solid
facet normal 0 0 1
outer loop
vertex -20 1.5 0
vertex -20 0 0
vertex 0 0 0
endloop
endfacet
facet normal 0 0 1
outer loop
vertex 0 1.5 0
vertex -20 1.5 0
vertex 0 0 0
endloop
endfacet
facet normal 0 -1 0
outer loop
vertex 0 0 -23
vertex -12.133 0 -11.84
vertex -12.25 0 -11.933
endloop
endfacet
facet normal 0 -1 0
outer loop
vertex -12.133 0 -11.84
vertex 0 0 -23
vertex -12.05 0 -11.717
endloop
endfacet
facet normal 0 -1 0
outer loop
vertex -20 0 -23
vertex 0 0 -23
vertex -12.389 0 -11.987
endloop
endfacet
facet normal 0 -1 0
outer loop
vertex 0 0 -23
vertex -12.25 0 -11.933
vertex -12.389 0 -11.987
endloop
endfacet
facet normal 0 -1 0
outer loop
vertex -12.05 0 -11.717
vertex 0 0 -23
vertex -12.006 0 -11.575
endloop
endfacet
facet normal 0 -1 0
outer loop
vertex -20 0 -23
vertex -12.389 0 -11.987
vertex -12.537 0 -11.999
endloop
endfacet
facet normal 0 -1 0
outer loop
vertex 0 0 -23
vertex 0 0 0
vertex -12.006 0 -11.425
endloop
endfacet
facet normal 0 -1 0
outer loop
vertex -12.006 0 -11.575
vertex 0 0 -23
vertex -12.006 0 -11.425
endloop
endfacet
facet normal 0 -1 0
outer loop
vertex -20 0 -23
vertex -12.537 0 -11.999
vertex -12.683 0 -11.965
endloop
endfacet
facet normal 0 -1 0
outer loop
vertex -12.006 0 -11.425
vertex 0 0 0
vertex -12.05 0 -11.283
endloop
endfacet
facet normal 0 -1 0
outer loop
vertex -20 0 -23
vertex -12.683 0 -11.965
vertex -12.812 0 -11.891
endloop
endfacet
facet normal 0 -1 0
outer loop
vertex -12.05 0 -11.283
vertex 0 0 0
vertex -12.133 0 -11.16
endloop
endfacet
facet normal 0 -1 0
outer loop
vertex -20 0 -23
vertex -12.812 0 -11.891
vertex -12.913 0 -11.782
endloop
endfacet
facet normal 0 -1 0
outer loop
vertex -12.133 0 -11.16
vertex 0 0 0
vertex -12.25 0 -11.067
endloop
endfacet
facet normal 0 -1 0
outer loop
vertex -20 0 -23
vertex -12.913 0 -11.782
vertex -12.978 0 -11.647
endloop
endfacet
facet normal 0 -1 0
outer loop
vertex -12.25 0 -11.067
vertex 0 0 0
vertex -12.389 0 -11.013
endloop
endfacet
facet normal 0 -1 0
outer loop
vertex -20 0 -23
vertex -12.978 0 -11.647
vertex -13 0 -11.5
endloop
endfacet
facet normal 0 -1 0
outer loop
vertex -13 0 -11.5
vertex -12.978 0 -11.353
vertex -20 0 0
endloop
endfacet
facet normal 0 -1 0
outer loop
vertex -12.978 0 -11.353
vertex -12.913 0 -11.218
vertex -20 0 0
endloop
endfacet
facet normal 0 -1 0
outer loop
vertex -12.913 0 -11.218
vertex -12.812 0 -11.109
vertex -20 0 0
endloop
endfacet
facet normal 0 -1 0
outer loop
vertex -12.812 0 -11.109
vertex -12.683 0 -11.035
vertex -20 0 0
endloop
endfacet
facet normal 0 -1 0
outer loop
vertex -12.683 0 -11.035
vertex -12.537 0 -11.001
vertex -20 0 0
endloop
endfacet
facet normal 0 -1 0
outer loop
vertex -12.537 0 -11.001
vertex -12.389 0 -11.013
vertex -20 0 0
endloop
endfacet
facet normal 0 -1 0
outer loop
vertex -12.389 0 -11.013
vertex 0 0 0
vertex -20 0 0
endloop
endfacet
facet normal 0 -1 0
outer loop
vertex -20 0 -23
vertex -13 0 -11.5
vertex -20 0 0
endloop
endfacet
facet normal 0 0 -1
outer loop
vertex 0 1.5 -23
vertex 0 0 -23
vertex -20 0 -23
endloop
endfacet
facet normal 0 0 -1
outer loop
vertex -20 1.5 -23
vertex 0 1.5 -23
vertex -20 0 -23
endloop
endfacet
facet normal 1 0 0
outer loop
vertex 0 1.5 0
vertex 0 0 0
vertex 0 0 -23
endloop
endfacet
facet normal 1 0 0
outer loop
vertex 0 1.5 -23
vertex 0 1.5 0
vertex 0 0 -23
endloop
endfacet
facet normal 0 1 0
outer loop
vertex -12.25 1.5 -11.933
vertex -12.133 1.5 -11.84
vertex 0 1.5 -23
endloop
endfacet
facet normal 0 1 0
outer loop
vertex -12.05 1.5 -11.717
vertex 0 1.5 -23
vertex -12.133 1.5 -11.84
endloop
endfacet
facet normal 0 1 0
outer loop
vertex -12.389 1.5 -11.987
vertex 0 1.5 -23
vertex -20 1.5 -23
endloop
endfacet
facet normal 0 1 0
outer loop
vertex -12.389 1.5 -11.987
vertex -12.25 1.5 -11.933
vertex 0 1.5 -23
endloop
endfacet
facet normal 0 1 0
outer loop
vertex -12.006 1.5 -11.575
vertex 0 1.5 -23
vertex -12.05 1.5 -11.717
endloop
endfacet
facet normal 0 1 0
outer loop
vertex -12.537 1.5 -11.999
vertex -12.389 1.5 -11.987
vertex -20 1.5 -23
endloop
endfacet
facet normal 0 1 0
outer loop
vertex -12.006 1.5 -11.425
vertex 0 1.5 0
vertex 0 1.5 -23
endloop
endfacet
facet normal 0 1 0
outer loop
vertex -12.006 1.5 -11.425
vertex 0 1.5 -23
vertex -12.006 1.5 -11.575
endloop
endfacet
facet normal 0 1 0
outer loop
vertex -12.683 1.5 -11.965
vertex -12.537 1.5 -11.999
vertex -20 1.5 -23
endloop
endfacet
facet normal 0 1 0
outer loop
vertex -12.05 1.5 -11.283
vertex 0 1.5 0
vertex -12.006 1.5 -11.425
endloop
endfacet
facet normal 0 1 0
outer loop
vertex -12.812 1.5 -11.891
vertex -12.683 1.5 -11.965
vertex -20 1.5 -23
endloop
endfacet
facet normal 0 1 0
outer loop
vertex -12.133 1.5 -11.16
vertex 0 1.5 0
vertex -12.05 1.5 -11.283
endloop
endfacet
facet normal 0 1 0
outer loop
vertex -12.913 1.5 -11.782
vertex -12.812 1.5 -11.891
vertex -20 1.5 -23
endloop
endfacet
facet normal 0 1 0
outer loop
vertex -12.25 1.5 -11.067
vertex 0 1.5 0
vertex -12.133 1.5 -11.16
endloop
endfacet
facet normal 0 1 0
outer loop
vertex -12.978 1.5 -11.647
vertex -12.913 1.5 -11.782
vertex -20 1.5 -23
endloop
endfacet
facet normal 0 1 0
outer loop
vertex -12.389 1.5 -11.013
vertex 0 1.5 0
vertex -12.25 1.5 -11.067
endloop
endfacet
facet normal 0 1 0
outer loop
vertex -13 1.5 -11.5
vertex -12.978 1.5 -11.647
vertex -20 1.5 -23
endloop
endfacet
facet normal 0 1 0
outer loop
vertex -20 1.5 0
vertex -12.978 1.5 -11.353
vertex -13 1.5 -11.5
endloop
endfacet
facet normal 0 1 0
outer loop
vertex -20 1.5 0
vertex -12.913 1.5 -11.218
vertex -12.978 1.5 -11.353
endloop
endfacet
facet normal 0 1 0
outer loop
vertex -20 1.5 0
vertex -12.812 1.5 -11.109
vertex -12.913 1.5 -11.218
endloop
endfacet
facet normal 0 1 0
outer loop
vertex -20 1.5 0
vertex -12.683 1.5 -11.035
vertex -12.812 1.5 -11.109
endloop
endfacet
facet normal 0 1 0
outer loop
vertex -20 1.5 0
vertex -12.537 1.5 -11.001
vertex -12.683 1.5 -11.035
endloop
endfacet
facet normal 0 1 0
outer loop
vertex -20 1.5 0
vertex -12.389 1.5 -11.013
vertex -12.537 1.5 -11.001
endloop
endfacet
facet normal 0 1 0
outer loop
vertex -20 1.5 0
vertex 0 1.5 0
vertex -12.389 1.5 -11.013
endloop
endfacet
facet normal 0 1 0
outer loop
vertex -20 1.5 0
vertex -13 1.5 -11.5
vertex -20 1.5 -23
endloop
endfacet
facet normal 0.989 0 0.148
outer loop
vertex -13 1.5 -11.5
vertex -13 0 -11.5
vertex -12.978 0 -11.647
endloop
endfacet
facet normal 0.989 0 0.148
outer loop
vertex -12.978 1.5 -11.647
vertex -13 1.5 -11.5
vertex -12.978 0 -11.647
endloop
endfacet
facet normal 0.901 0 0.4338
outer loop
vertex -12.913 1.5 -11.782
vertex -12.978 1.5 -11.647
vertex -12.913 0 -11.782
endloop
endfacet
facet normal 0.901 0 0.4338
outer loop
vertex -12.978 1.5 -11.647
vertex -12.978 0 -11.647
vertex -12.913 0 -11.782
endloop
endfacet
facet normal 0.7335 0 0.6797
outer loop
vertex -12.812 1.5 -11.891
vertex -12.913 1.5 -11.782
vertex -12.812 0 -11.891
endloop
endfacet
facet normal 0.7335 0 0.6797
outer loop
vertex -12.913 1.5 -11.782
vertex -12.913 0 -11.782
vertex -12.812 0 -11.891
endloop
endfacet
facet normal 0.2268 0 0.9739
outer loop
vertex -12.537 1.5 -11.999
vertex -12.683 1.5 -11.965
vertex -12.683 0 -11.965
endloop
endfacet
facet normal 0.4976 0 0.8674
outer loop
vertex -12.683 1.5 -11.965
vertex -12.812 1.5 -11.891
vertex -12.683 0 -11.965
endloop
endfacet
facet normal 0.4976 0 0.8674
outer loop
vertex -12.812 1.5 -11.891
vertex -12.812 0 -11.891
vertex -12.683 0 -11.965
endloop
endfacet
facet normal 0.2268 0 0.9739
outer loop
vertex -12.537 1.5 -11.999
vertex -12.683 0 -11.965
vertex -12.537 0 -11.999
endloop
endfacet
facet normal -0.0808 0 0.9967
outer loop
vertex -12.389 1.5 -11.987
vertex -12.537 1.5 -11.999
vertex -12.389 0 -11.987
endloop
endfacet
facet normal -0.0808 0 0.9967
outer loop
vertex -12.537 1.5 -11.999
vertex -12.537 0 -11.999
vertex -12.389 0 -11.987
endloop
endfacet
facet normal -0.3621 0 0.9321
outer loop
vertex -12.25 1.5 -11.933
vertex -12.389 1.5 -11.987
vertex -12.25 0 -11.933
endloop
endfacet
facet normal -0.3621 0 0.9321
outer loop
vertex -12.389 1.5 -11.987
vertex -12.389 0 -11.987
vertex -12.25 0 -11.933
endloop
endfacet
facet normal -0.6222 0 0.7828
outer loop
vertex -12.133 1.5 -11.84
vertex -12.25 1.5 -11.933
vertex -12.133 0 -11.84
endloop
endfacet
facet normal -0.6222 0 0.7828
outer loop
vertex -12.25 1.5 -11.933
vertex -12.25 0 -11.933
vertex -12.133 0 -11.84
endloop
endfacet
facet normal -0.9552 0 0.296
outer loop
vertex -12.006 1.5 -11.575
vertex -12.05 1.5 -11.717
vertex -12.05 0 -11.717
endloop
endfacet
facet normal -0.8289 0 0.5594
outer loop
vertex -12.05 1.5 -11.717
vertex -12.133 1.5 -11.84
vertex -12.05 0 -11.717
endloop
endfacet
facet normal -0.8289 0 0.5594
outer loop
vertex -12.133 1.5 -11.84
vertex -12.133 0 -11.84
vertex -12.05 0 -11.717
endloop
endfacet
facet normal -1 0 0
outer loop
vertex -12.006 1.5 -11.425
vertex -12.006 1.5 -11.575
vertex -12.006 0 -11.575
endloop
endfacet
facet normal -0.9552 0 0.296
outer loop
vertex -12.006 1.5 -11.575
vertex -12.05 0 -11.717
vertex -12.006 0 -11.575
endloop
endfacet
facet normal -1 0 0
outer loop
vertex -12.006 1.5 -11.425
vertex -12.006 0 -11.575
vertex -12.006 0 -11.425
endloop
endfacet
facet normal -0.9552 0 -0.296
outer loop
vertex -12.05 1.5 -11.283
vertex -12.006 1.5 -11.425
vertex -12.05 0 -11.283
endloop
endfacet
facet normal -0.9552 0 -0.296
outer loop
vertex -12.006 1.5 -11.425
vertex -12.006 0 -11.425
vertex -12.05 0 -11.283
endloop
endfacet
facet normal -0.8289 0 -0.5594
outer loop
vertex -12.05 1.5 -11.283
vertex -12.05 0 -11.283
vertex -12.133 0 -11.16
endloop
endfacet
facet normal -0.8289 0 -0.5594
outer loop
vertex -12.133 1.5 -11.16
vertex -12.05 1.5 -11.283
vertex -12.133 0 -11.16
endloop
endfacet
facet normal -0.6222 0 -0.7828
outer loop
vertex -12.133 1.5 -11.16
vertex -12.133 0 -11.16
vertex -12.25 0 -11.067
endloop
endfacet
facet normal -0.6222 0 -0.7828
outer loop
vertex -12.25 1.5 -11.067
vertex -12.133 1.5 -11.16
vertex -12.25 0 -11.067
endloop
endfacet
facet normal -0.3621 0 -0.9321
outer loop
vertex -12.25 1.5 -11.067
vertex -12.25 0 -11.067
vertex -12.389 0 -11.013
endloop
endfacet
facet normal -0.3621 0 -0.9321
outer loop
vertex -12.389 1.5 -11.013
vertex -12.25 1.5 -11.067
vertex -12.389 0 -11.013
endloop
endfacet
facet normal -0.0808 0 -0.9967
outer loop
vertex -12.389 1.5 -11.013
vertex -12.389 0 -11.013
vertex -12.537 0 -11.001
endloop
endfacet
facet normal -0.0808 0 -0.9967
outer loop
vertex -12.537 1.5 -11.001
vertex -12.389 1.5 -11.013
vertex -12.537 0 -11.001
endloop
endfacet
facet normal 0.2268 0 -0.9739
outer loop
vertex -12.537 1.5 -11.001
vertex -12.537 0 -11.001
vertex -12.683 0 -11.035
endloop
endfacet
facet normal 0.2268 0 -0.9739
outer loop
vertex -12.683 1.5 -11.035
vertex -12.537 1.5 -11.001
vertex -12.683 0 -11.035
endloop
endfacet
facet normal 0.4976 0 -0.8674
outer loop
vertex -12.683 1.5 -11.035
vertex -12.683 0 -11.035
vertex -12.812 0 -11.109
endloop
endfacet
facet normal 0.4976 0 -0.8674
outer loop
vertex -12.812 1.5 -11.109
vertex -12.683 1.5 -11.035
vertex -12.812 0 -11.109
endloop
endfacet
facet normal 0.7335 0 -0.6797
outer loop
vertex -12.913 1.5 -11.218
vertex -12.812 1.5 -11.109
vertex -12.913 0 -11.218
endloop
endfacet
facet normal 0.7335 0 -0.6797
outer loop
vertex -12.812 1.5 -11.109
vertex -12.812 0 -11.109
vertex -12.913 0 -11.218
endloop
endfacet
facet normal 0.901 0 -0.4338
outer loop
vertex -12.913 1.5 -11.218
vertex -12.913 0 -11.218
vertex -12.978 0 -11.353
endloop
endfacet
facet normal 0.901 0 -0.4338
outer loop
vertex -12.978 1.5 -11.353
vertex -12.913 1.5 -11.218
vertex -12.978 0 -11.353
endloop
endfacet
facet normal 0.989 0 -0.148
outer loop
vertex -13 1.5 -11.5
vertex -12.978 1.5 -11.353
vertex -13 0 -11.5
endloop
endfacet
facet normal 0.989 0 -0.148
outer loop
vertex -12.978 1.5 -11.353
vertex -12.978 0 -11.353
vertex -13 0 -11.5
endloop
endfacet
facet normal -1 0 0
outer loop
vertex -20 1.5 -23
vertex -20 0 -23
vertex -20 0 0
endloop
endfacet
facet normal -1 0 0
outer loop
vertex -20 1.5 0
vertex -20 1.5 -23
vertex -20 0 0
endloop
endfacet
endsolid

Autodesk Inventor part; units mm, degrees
ref_plane "YZ Plane" through (0, 0, 0) normal (1, 0, 0) x (0, 1, 0)
ref_plane "XZ Plane" through (0, 0, 0) normal (0, 1, 0) x (-1, 0, 0)
ref_plane "XY Plane" through (0, 0, 0) normal (0, 0, 1) x (1, 0, 0)
sketch "Sketch1" plane through (0, 0, 0) normal (0, 1, 0) x (-1, 0, 0)
  line L0 (0, 0) -> (0, -23)
  line L1 (0, -23) -> (20, -23)
  line L2 (20, -23) -> (20, 0)
  line L3 (16.0214, -11.5) -> (3.8301, -11.5) construction
  circle A0 centre (12.5, -11.5) radius 0.5
  line L4 (20, 0) -> (0, 0)
  dimension "d0" = 23
  dimension "d2" = 1
  dimension "d3" = 7.5
  dimension "d10" = 20
extrude "Extrusion3" add sketch "Sketch1" along normal blind 1.5
properties part number "Distance_test_adaptor_circle_1mm"
